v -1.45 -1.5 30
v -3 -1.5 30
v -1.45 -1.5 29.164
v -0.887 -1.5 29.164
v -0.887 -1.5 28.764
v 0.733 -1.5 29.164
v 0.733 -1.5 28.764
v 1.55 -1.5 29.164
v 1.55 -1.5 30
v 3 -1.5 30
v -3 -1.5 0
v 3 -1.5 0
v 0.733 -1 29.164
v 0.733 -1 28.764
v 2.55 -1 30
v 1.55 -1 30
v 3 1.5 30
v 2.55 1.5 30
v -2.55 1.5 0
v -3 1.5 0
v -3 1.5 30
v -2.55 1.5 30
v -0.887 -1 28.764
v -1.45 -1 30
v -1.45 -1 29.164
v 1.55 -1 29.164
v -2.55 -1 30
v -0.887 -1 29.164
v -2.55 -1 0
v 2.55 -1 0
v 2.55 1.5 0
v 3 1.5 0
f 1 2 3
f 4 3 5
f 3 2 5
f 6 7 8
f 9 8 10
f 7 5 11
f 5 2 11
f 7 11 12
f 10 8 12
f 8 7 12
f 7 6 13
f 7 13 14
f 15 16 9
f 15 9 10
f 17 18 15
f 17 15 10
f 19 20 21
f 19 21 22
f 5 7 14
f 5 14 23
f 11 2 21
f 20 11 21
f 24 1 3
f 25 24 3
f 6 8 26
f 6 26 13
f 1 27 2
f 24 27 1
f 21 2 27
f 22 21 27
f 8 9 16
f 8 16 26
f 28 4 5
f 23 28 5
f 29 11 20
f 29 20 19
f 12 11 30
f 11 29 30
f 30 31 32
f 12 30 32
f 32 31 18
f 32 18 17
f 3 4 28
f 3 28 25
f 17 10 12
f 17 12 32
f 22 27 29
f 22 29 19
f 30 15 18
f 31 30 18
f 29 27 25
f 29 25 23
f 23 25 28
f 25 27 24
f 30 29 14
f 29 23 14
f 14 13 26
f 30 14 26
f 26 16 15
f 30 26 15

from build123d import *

# Parameters (mm, degrees)
SKETCH_1_W          = 6
SKETCH_1_H          = 3
EXTRUDE_1_DEPTH     = 30
SKETCH_4_W          = 5.1
SKETCH_4_H          = 2.5
CUT_EXTRUDE_1_DEPTH = 30
SKETCH_6_W          = 3
SKETCH_6_H          = 0.836449827
CUT_EXTRUDE_2_DEPTH = 0.5
SKETCH_8_W          = 1.62
SKETCH_8_H          = 0.4
CUT_EXTRUDE_3_DEPTH = 0.5


with BuildPart() as part:
    # 草圖1 → 填料-伸長1 (new body)
    with BuildSketch(Plane.XY):
        Rectangle(SKETCH_1_W, SKETCH_1_H)
    extrude(amount=EXTRUDE_1_DEPTH)

    # 草圖4 → 除料-伸長1 (cut)
    with BuildSketch(Plane.XY.offset(30)):
        with Locations((0, 0.25)):
            Rectangle(SKETCH_4_W, SKETCH_4_H)
    extrude(amount=-CUT_EXTRUDE_1_DEPTH, mode=Mode.SUBTRACT)

    # 草圖6 → 除料-伸長2 (cut)
    with BuildSketch(Plane(origin=(0, -1.5, 0), x_dir=(-1, 0, 0), z_dir=(0, -1, 0))):
        with Locations((-0.05, -29.581775087)):
            Rectangle(SKETCH_6_W, SKETCH_6_H)
    extrude(amount=-CUT_EXTRUDE_2_DEPTH, mode=Mode.SUBTRACT)

    # 草圖8 → 除料-伸長3 (cut)
    with BuildSketch(Plane(origin=(0, -1.5, 0), x_dir=(-1, 0, 0), z_dir=(0, -1, 0))):
        with Locations((0.076588476, -28.963550173)):
            Rectangle(SKETCH_8_W, SKETCH_8_H)
    extrude(amount=-CUT_EXTRUDE_3_DEPTH, mode=Mode.SUBTRACT)


solid = part.part
